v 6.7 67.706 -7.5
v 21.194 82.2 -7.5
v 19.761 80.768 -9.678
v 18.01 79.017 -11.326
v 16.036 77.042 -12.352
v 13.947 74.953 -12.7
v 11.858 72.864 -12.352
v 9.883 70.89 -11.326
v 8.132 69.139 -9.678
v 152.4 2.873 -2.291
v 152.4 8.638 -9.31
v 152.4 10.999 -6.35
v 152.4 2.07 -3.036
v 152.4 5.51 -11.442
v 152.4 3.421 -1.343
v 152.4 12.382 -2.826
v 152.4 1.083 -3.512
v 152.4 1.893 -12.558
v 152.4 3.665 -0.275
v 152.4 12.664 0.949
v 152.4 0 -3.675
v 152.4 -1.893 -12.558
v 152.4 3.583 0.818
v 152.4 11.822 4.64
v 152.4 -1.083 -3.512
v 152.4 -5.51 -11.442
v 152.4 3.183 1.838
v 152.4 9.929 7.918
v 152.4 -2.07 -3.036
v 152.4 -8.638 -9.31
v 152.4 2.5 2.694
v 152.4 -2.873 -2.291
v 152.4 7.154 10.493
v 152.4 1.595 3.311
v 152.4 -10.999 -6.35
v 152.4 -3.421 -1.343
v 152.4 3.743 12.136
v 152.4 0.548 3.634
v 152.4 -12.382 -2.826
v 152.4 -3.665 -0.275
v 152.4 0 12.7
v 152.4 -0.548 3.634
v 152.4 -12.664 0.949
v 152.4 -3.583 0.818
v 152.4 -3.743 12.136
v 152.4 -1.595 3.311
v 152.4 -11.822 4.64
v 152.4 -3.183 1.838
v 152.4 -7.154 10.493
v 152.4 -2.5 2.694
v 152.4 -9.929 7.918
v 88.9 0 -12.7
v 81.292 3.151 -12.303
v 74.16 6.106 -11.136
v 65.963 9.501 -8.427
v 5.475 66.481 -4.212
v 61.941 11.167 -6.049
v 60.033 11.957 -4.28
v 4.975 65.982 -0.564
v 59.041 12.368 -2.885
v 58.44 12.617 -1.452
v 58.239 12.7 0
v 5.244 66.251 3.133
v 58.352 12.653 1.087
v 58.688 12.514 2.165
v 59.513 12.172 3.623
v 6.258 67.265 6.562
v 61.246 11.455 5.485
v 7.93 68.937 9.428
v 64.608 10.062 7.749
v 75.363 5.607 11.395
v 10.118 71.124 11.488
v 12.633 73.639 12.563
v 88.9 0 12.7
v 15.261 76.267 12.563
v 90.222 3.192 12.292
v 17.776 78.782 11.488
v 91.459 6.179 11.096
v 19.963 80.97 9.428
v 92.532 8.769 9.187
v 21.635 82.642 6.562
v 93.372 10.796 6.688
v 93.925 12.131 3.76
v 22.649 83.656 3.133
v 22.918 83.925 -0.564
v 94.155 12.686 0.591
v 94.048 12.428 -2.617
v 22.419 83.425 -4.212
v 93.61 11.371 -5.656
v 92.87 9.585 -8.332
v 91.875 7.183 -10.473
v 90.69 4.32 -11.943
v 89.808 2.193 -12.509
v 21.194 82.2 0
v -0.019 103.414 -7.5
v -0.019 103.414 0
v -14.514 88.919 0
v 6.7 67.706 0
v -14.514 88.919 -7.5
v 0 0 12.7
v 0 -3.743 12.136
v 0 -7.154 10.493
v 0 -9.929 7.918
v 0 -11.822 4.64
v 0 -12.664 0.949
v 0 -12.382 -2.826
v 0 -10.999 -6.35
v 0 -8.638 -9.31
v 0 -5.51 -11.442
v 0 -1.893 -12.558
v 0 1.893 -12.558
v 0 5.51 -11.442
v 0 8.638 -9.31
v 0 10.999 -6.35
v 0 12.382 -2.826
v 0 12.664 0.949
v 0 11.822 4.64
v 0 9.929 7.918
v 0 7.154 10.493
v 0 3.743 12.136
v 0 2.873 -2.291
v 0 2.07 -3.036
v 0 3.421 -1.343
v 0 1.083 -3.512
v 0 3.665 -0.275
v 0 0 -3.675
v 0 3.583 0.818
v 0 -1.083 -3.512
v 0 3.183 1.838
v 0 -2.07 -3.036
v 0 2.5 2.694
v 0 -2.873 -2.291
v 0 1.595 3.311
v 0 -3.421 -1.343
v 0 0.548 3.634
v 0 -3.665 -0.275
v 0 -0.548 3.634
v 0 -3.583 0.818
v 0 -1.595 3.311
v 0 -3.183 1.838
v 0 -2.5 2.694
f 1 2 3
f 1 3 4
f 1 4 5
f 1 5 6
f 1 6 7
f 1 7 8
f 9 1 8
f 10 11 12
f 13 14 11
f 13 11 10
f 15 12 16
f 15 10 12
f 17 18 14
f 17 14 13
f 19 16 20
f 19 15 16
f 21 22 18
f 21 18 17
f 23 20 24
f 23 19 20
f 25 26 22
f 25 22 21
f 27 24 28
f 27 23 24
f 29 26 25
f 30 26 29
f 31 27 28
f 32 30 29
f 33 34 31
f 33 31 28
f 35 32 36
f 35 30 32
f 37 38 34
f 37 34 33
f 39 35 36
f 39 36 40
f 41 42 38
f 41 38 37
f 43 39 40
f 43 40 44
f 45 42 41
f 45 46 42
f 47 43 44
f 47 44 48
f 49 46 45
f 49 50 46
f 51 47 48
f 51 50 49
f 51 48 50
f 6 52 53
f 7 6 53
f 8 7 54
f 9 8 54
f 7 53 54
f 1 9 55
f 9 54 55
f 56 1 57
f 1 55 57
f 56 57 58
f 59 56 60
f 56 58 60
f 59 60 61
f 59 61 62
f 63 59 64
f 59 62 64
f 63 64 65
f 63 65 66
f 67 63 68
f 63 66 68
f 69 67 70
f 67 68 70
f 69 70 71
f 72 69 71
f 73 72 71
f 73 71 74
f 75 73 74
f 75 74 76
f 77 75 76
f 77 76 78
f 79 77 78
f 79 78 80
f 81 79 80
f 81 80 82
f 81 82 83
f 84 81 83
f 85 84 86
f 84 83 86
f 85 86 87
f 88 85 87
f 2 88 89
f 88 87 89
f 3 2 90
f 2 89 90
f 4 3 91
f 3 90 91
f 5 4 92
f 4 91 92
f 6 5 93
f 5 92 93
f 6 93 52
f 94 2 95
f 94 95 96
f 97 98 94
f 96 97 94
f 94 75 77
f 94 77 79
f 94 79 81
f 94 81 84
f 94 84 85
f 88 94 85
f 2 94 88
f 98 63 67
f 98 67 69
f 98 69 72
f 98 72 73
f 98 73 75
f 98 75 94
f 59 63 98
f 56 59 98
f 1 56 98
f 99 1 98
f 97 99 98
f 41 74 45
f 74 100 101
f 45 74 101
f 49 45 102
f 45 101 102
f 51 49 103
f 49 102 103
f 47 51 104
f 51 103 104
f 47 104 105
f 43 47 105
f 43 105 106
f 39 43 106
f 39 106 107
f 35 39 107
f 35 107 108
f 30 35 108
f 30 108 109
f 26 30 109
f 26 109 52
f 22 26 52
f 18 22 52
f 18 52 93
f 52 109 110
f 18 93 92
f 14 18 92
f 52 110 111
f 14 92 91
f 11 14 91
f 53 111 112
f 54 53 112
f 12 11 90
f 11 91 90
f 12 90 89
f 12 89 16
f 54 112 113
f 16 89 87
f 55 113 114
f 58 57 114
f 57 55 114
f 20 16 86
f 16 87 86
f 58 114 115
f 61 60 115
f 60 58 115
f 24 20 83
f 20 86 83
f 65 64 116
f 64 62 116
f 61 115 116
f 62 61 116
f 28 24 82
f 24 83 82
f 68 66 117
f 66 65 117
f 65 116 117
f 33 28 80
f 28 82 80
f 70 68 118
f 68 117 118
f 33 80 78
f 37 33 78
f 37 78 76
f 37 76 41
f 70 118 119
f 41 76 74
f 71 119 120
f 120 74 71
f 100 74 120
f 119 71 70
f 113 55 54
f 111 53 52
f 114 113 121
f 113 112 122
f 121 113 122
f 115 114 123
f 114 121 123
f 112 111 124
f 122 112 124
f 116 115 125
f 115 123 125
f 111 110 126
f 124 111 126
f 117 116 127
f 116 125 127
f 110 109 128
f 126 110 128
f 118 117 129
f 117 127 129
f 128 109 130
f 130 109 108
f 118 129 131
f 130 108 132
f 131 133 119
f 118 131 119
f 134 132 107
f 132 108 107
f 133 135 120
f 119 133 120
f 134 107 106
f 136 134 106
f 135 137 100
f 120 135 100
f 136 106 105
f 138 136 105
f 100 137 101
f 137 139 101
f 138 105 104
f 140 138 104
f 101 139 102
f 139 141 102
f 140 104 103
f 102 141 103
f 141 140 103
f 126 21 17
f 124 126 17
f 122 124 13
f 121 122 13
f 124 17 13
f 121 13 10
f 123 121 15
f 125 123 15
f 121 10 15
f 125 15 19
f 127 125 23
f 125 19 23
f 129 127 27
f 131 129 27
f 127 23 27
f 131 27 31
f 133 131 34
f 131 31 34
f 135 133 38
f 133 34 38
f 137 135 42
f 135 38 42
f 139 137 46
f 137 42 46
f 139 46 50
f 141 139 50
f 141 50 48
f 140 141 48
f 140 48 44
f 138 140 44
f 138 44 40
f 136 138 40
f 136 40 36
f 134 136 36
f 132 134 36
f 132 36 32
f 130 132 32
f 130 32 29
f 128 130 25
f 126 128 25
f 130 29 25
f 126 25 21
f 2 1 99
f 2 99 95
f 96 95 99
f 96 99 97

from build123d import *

# Parameters (mm, degrees)
SKETCH1_R           = 12.7
BOSS_EXTRUDE1_DEPTH = 152.4
SKETCH7_R           = 12.7
BOSS_EXTRUDE3_DEPTH = 106
SKETCH10_W          = 7.5
SKETCH10_H          = 20.497804761
BOSS_EXTRUDE8_DEPTH = 30
SKETCH11_R          = 3.675
CUT_EXTRUDE2_DEPTH  = 152.4


with BuildPart() as part:
    # Sketch1 → Boss-Extrude1 (new body)
    with BuildSketch(Plane(origin=(0, 0, 0), x_dir=(0, 0, -1), z_dir=(1, 0, 0))):
        with Locations(Location((0, 0, 0), (0, 0, 180))):
            Circle(SKETCH1_R)
    extrude(amount=BOSS_EXTRUDE1_DEPTH)

    # Sketch7 → Boss-Extrude3 (add)
    with BuildSketch(Plane(origin=(44.45, -44.45, 0), x_dir=(0.7071067811865464, 0.7071067811865488, 0), z_dir=(-0.7071067811865488, 0.7071067811865464, 0))):
        with Locations(Location((62.861792847, 0, 0), (0, 0, 90))):
            Circle(SKETCH7_R)
    extrude(amount=BOSS_EXTRUDE3_DEPTH)

    # Sketch10 → Boss-Extrude8 (add)
    with BuildSketch(Plane(origin=(-30.503318806, 30.503318806, 0), x_dir=(0, 0, 1), z_dir=(-0.7071067811865487, 0.7071067811865465, 0))):
        with Locations((-3.75, 62.861792848)):
            Rectangle(SKETCH10_W, SKETCH10_H)
    extrude(amount=BOSS_EXTRUDE8_DEPTH)

    # Sketch11 → Cut-Extrude2 (cut)
    with BuildSketch(Plane(origin=(152.4, 0, 0), x_dir=(0, 0, -1), z_dir=(1, 0, 0))):
        Circle(SKETCH11_R)
    extrude(amount=-CUT_EXTRUDE2_DEPTH, mode=Mode.SUBTRACT)


solid = part.part
